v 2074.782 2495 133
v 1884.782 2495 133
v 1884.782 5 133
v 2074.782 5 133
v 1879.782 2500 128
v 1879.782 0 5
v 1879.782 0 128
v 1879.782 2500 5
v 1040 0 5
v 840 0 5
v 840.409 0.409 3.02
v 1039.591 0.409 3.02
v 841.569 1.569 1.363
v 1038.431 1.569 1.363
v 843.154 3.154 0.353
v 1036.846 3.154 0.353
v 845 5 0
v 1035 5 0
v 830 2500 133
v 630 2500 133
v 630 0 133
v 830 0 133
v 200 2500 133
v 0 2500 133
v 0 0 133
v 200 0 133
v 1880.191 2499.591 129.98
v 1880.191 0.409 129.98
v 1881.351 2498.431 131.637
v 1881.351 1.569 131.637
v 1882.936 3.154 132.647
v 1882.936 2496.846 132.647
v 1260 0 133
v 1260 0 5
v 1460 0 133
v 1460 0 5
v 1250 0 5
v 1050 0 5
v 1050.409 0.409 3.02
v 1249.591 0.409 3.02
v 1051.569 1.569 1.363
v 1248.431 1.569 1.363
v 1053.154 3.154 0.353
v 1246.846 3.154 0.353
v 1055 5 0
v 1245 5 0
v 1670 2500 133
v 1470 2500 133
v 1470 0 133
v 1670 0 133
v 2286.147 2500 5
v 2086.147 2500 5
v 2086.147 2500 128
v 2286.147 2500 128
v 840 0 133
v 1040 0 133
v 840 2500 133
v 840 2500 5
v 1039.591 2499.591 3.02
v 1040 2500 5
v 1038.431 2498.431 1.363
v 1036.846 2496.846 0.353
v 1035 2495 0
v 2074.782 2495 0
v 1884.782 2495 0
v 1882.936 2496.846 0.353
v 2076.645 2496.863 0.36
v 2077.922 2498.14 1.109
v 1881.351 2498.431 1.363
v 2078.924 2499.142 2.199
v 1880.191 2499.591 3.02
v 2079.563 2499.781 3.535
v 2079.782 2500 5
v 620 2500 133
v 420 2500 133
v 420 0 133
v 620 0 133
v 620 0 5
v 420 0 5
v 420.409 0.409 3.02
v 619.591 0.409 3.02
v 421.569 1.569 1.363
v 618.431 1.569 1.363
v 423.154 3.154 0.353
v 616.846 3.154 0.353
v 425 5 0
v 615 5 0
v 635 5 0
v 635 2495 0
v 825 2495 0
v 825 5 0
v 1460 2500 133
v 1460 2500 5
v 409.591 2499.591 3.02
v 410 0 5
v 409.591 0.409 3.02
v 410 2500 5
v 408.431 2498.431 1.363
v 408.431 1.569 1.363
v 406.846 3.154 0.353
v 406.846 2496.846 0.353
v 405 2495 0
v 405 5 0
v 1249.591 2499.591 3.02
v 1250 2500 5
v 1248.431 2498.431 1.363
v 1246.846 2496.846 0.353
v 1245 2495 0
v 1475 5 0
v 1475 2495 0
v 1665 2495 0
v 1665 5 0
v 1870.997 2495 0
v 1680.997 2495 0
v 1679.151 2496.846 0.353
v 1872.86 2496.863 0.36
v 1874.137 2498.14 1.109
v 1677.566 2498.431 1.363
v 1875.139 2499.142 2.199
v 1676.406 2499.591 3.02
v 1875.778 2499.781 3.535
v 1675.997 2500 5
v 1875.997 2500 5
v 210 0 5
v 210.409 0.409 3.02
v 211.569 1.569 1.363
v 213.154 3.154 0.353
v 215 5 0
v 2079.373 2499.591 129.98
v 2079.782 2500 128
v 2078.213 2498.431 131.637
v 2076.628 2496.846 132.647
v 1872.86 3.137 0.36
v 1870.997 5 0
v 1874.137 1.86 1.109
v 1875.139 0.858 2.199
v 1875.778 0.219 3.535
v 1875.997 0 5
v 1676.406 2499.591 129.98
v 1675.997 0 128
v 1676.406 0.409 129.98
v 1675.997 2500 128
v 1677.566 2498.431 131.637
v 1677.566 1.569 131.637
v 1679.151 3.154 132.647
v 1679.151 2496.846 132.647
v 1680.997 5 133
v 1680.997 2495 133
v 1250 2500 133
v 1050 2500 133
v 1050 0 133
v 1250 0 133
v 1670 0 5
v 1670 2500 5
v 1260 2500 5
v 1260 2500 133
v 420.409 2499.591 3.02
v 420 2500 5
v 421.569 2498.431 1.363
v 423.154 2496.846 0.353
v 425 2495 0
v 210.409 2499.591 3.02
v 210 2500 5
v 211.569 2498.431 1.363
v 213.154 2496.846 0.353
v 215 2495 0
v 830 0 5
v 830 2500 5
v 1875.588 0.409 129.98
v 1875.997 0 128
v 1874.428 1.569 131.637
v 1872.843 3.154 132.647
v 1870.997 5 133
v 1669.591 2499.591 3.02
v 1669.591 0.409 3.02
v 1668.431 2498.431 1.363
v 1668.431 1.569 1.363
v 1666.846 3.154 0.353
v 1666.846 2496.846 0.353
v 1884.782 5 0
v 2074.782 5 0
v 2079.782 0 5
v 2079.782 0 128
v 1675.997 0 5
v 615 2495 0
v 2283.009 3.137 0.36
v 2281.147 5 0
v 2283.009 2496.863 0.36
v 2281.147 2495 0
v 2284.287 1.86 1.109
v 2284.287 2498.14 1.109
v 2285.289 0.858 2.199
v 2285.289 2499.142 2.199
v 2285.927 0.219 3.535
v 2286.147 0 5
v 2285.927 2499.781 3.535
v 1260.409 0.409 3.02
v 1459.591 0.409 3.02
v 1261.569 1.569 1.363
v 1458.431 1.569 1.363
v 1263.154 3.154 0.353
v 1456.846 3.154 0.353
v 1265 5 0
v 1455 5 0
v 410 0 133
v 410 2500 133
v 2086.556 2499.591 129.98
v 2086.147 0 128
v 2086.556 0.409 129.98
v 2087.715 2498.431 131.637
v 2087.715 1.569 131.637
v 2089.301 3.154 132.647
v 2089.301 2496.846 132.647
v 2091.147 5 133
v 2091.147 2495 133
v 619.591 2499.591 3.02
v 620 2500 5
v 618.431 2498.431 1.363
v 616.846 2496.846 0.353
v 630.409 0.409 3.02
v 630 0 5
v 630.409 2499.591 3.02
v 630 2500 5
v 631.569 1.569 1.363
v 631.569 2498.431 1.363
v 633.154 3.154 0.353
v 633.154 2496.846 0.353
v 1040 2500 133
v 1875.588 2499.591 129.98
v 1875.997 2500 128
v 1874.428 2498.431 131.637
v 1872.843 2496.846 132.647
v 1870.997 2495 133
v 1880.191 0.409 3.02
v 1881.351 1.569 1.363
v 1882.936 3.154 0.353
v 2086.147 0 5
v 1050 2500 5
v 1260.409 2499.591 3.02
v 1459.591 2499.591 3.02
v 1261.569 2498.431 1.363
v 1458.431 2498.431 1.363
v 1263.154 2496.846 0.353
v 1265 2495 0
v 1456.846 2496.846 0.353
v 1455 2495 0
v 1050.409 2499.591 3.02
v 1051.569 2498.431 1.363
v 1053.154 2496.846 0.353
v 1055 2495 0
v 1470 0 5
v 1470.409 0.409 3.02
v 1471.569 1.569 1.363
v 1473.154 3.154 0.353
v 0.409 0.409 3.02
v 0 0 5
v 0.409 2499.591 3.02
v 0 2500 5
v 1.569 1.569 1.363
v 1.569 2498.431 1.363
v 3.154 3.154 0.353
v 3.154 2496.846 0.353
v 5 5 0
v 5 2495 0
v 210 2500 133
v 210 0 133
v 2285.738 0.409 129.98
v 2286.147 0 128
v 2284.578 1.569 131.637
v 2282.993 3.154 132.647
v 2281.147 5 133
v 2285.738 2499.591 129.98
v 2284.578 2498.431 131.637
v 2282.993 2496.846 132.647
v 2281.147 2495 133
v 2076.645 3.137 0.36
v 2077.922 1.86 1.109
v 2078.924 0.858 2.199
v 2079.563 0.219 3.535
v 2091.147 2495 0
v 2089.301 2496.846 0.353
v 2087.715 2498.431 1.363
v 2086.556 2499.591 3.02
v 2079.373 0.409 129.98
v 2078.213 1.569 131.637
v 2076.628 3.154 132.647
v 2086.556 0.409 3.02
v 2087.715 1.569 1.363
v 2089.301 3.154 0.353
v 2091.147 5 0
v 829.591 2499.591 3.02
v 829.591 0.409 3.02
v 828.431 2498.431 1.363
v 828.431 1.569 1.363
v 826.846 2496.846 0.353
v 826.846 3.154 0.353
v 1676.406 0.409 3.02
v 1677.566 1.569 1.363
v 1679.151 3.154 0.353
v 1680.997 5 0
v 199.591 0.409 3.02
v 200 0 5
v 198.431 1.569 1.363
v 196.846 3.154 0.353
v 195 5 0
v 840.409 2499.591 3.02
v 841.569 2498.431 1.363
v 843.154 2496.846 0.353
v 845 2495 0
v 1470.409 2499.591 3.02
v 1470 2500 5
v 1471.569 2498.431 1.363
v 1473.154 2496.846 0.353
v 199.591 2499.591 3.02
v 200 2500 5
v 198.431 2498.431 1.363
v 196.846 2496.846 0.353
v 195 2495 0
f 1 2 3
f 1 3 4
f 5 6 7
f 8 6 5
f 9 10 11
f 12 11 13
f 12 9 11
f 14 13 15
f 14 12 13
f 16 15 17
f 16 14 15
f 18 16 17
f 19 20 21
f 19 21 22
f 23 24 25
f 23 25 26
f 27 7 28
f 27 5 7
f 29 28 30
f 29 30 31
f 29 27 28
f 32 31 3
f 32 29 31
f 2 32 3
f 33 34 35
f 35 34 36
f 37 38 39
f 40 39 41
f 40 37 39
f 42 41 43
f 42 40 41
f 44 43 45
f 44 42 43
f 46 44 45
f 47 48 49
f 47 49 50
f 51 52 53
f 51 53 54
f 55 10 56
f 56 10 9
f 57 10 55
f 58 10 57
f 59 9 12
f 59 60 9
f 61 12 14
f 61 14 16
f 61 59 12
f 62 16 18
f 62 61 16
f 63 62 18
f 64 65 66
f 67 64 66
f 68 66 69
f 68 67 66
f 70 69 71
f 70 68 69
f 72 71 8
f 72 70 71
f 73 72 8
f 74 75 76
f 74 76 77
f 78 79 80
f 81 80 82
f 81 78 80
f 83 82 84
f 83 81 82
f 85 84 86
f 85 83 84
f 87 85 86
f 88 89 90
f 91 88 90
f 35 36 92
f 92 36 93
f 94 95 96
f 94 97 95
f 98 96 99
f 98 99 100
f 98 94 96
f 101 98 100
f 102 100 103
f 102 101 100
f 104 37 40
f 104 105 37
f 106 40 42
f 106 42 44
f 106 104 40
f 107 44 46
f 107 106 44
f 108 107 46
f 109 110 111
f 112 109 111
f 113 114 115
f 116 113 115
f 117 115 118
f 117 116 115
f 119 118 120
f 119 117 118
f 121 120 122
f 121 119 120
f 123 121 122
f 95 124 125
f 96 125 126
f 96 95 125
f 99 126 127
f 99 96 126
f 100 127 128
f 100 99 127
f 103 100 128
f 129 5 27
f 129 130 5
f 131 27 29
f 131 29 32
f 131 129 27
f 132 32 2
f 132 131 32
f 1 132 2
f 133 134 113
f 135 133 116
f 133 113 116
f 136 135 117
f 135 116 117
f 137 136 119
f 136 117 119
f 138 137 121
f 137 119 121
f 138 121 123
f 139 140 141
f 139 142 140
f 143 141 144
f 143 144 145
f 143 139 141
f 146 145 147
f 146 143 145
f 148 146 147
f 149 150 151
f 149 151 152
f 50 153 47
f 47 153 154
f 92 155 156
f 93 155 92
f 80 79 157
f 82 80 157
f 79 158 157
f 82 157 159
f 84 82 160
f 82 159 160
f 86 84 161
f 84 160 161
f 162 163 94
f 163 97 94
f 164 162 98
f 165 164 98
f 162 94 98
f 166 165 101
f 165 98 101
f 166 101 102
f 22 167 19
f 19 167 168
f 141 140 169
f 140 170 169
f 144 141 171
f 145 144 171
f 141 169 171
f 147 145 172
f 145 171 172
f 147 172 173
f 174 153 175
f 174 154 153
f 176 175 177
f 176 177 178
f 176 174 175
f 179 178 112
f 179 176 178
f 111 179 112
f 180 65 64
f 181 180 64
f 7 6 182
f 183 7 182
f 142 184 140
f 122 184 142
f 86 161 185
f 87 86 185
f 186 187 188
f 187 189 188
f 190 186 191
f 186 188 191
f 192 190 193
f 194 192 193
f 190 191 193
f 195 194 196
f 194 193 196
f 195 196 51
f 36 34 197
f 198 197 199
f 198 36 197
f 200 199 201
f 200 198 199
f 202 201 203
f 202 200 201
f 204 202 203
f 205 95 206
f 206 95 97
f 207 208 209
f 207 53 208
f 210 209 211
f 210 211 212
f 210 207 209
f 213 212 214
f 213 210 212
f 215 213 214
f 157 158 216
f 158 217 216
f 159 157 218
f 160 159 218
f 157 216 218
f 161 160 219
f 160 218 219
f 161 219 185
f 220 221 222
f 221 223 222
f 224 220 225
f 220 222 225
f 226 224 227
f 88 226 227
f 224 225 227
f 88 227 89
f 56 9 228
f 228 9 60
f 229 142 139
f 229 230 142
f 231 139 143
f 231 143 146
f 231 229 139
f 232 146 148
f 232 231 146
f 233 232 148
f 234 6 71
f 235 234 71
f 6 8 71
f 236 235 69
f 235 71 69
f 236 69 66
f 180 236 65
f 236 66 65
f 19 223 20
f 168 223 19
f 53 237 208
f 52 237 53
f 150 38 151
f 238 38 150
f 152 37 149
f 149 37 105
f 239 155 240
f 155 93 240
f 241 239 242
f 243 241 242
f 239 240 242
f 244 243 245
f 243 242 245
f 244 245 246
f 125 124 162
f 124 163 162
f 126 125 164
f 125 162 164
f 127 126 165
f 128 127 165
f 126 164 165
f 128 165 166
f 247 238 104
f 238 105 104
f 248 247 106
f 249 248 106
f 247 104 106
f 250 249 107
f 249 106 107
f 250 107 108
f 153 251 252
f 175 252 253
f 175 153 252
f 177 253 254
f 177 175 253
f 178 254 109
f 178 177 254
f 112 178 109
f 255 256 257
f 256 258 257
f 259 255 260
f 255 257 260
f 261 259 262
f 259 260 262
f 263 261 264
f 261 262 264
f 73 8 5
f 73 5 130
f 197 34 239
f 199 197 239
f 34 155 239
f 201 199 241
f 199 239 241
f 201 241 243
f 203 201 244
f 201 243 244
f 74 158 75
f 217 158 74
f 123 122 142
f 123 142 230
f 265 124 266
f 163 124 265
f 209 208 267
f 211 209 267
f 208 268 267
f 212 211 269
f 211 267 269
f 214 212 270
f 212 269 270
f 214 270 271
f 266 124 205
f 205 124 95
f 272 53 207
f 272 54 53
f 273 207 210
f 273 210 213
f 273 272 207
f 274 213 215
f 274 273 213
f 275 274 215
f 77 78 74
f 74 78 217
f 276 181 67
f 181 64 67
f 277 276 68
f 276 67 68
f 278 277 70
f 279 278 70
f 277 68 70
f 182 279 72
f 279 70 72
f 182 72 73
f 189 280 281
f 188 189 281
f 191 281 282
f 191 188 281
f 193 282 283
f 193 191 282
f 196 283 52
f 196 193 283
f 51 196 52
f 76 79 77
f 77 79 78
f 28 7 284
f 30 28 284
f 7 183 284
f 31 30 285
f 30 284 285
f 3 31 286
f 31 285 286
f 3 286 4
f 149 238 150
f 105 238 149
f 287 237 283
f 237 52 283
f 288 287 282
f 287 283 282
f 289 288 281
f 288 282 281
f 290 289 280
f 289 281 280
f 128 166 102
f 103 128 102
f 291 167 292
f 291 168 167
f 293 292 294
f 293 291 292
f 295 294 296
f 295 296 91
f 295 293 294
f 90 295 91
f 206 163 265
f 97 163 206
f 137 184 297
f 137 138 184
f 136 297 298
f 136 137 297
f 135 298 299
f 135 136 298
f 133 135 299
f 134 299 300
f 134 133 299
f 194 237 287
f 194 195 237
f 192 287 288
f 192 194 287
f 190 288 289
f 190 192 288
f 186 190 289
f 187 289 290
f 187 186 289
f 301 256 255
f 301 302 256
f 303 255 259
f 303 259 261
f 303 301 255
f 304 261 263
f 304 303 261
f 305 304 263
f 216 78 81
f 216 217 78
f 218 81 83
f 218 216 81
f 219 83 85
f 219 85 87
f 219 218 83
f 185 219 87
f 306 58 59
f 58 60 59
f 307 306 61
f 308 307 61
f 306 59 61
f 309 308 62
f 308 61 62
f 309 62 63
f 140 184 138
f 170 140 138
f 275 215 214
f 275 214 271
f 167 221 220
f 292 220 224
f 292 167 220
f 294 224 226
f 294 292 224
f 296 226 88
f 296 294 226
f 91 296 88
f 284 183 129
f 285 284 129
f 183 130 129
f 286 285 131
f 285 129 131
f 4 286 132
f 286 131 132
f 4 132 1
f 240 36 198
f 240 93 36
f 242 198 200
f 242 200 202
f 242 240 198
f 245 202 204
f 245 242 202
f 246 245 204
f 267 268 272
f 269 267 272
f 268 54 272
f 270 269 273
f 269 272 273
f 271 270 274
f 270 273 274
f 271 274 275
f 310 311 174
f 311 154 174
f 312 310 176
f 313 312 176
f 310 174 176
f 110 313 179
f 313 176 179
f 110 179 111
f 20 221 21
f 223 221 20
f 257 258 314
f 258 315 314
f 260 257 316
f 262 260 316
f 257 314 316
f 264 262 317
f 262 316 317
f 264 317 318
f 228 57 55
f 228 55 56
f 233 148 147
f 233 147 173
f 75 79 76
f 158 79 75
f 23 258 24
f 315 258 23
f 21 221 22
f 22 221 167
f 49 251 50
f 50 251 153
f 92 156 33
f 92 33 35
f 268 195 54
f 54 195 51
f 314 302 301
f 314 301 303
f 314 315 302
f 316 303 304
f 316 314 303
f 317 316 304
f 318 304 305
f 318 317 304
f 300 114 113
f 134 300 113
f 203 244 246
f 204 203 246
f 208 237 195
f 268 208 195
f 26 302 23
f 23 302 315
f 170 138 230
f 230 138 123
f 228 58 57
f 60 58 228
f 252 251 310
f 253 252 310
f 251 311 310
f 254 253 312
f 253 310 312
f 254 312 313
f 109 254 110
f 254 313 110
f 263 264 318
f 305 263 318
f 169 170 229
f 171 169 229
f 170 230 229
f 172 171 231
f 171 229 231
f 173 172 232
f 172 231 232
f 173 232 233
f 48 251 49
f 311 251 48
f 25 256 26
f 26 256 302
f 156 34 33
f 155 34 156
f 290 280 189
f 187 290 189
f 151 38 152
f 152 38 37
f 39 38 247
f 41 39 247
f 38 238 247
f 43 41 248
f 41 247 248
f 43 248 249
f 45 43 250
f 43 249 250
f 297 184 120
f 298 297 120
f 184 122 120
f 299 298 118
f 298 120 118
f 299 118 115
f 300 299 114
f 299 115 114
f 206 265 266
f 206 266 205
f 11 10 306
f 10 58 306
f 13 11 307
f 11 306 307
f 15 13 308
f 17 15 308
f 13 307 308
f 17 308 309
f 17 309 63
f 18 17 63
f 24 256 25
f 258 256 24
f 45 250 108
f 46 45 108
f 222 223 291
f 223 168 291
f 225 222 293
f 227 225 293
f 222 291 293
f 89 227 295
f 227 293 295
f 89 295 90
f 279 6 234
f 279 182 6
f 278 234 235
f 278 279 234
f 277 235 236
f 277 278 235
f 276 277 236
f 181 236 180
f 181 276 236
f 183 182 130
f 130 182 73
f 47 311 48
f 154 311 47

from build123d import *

# Parameters (mm, degrees)
SKETCH1_W              = 200
SKETCH1_H              = 2500
BOSS_EXTRUDE1_DEPTH    = 133
BOSS_EXTRUDE1_2_DEPTH  = 133
BOSS_EXTRUDE1_3_DEPTH  = 133
BOSS_EXTRUDE1_4_DEPTH  = 133
BOSS_EXTRUDE1_5_DEPTH  = 133
BOSS_EXTRUDE1_6_DEPTH  = 133
BOSS_EXTRUDE1_7_DEPTH  = 133
BOSS_EXTRUDE1_8_DEPTH  = 133
BOSS_EXTRUDE1_9_DEPTH  = 133
BOSS_EXTRUDE1_10_DEPTH = 133
BOSS_EXTRUDE1_11_DEPTH = 133
FILLET1_R              = 5
FILLET2_R              = 5
FILLET3_R              = 5
FILLET4_R              = 5
FILLET5_R              = 5
FILLET6_R              = 5
FILLET7_R              = 5
FILLET8_R              = 5
FILLET9_R              = 5
FILLET10_R             = 5
FILLET11_R             = 5
FILLET12_R             = 5
FILLET13_R             = 5
FILLET14_R             = 5


with BuildPart() as part:
    # Sketch1 → Boss-Extrude1 (new body)
    with BuildSketch(Plane.XY):
        with Locations((310, 1250)):
            Rectangle(SKETCH1_W, SKETCH1_H)
    extrude(amount=BOSS_EXTRUDE1_DEPTH)

    # Fillet8
    fillet8_edges = [part.edges().sort_by_distance(p)[0] for p in [
        (210, 1250, 0),
        (310, 2500, 0),
        (410, 1250, 0),
        (310, 0, 0),
    ]]
    fillet(fillet8_edges, radius=FILLET8_R)


with BuildPart() as body_2:
    # Sketch1 → Boss-Extrude1 2 (new body)
    with BuildSketch(Plane.XY):
        with Locations((100, 1250)):
            Rectangle(SKETCH1_W, SKETCH1_H)
    extrude(amount=BOSS_EXTRUDE1_2_DEPTH)

    # Fillet1
    fillet1_edges = [body_2.edges().sort_by_distance(p)[0] for p in [
        (100, 2500, 0),
        (200, 1250, 0),
        (100, 0, 0),
        (0, 1250, 0),
    ]]
    fillet(fillet1_edges, radius=FILLET1_R)


with BuildPart() as body_3:
    # Sketch1 → Boss-Extrude1 3 (new body)
    with BuildSketch(Plane.XY):
        with Locations((520, 1250)):
            Rectangle(SKETCH1_W, SKETCH1_H)
    extrude(amount=BOSS_EXTRUDE1_3_DEPTH)

    # Fillet7
    fillet7_edges = [body_3.edges().sort_by_distance(p)[0] for p in [
        (420, 1250, 0),
        (520, 2500, 0),
        (620, 1250, 0),
        (520, 0, 0),
    ]]
    fillet(fillet7_edges, radius=FILLET7_R)


with BuildPart() as body_4:
    # Sketch1 → Boss-Extrude1 4 (new body)
    with BuildSketch(Plane.XY):
        with Locations((730, 1250)):
            Rectangle(SKETCH1_W, SKETCH1_H)
    extrude(amount=BOSS_EXTRUDE1_4_DEPTH)

    # Fillet6
    fillet6_edges = [body_4.edges().sort_by_distance(p)[0] for p in [
        (630, 1250, 0),
        (730, 2500, 0),
        (830, 1250, 0),
        (730, 0, 0),
    ]]
    fillet(fillet6_edges, radius=FILLET6_R)


with BuildPart() as body_5:
    # Sketch1 → Boss-Extrude1 5 (new body)
    with BuildSketch(Plane.XY):
        with Locations((940, 1250)):
            Rectangle(SKETCH1_W, SKETCH1_H)
    extrude(amount=BOSS_EXTRUDE1_5_DEPTH)

    # Fillet5
    fillet5_edges = [body_5.edges().sort_by_distance(p)[0] for p in [
        (840, 1250, 0),
        (940, 2500, 0),
        (1040, 1250, 0),
        (940, 0, 0),
    ]]
    fillet(fillet5_edges, radius=FILLET5_R)


with BuildPart() as body_6:
    # Sketch1 → Boss-Extrude1 6 (new body)
    with BuildSketch(Plane.XY):
        with Locations((1150, 1250)):
            Rectangle(SKETCH1_W, SKETCH1_H)
    extrude(amount=BOSS_EXTRUDE1_6_DEPTH)

    # Fillet4
    fillet4_edges = [body_6.edges().sort_by_distance(p)[0] for p in [
        (1050, 1250, 0),
        (1150, 2500, 0),
        (1250, 1250, 0),
        (1150, 0, 0),
    ]]
    fillet(fillet4_edges, radius=FILLET4_R)


with BuildPart() as body_7:
    # Sketch1 → Boss-Extrude1 7 (new body)
    with BuildSketch(Plane.XY):
        with Locations((1360, 1250)):
            Rectangle(SKETCH1_W, SKETCH1_H)
    extrude(amount=BOSS_EXTRUDE1_7_DEPTH)

    # Fillet3
    fillet3_edges = [body_7.edges().sort_by_distance(p)[0] for p in [
        (1260, 1250, 0),
        (1360, 2500, 0),
        (1460, 1250, 0),
        (1360, 0, 0),
    ]]
    fillet(fillet3_edges, radius=FILLET3_R)


with BuildPart() as body_8:
    # Sketch1 → Boss-Extrude1 8 (new body)
    with BuildSketch(Plane.XY):
        with Locations((1570, 1250)):
            Rectangle(SKETCH1_W, SKETCH1_H)
    extrude(amount=BOSS_EXTRUDE1_8_DEPTH)

    # Fillet2
    fillet2_edges = [body_8.edges().sort_by_distance(p)[0] for p in [
        (1470, 1250, 0),
        (1570, 2500, 0),
        (1670, 1250, 0),
        (1570, 0, 0),
    ]]
    fillet(fillet2_edges, radius=FILLET2_R)


with BuildPart() as body_9:
    # Sketch1 → Boss-Extrude1 9 (new body)
    with BuildSketch(Plane.XY):
        with Locations((1775.997192349, 1250)):
            Rectangle(SKETCH1_W, SKETCH1_H)
    extrude(amount=BOSS_EXTRUDE1_9_DEPTH)

    # Fillet9
    fillet9_edges = [body_9.edges().sort_by_distance(p)[0] for p in [
        (1775.997192349, 2500, 133),
        (1675.997192349, 1250, 133),
        (1775.997192349, 0, 133),
        (1875.997192349, 1250, 133),
    ]]
    fillet(fillet9_edges, radius=FILLET9_R)

    # Fillet13
    fillet13_edges = [body_9.edges().sort_by_distance(p)[0] for p in [
        (1675.997192349, 1250, 0),
        (1775.997192349, 2500, 0),
        (1875.997192349, 1250, 0),
        (1775.997192349, 0, 0),
    ]]
    fillet(fillet13_edges, radius=FILLET13_R)


with BuildPart() as body_10:
    # Sketch1 → Boss-Extrude1 10 (new body)
    with BuildSketch(Plane.XY):
        with Locations((1979.782009001, 1250)):
            Rectangle(SKETCH1_W, SKETCH1_H)
    extrude(amount=BOSS_EXTRUDE1_10_DEPTH)

    # Fillet10
    fillet10_edges = [body_10.edges().sort_by_distance(p)[0] for p in [
        (1979.782009001, 2500, 133),
        (1879.782009001, 1250, 133),
        (1979.782009001, 0, 133),
        (2079.782009001, 1250, 133),
    ]]
    fillet(fillet10_edges, radius=FILLET10_R)

    # Fillet12
    fillet12_edges = [body_10.edges().sort_by_distance(p)[0] for p in [
        (1879.782009001, 1250, 0),
        (1979.782009001, 2500, 0),
        (2079.782009001, 1250, 0),
        (1979.782009001, 0, 0),
    ]]
    fillet(fillet12_edges, radius=FILLET12_R)


with BuildPart() as body_11:
    # Sketch1 → Boss-Extrude1 11 (new body)
    with BuildSketch(Plane.XY):
        with Locations((2186.146700922, 1250)):
            Rectangle(SKETCH1_W, SKETCH1_H)
    extrude(amount=BOSS_EXTRUDE1_11_DEPTH)

    # Fillet11
    fillet11_edges = [body_11.edges().sort_by_distance(p)[0] for p in [
        (2186.146700922, 2500, 133),
        (2086.146700922, 1250, 133),
        (2186.146700922, 0, 133),
        (2286.146700922, 1250, 133),
    ]]
    fillet(fillet11_edges, radius=FILLET11_R)

    # Fillet14
    fillet14_edges = [body_11.edges().sort_by_distance(p)[0] for p in [
        (2086.146700922, 1250, 0),
        (2186.146700922, 2500, 0),
        (2286.146700922, 1250, 0),
        (2186.146700922, 0, 0),
    ]]
    fillet(fillet14_edges, radius=FILLET14_R)


solid = Compound([part.part, body_2.part, body_3.part, body_4.part, body_5.part, body_6.part, body_7.part, body_8.part, body_9.part, body_10.part, body_11.part])
